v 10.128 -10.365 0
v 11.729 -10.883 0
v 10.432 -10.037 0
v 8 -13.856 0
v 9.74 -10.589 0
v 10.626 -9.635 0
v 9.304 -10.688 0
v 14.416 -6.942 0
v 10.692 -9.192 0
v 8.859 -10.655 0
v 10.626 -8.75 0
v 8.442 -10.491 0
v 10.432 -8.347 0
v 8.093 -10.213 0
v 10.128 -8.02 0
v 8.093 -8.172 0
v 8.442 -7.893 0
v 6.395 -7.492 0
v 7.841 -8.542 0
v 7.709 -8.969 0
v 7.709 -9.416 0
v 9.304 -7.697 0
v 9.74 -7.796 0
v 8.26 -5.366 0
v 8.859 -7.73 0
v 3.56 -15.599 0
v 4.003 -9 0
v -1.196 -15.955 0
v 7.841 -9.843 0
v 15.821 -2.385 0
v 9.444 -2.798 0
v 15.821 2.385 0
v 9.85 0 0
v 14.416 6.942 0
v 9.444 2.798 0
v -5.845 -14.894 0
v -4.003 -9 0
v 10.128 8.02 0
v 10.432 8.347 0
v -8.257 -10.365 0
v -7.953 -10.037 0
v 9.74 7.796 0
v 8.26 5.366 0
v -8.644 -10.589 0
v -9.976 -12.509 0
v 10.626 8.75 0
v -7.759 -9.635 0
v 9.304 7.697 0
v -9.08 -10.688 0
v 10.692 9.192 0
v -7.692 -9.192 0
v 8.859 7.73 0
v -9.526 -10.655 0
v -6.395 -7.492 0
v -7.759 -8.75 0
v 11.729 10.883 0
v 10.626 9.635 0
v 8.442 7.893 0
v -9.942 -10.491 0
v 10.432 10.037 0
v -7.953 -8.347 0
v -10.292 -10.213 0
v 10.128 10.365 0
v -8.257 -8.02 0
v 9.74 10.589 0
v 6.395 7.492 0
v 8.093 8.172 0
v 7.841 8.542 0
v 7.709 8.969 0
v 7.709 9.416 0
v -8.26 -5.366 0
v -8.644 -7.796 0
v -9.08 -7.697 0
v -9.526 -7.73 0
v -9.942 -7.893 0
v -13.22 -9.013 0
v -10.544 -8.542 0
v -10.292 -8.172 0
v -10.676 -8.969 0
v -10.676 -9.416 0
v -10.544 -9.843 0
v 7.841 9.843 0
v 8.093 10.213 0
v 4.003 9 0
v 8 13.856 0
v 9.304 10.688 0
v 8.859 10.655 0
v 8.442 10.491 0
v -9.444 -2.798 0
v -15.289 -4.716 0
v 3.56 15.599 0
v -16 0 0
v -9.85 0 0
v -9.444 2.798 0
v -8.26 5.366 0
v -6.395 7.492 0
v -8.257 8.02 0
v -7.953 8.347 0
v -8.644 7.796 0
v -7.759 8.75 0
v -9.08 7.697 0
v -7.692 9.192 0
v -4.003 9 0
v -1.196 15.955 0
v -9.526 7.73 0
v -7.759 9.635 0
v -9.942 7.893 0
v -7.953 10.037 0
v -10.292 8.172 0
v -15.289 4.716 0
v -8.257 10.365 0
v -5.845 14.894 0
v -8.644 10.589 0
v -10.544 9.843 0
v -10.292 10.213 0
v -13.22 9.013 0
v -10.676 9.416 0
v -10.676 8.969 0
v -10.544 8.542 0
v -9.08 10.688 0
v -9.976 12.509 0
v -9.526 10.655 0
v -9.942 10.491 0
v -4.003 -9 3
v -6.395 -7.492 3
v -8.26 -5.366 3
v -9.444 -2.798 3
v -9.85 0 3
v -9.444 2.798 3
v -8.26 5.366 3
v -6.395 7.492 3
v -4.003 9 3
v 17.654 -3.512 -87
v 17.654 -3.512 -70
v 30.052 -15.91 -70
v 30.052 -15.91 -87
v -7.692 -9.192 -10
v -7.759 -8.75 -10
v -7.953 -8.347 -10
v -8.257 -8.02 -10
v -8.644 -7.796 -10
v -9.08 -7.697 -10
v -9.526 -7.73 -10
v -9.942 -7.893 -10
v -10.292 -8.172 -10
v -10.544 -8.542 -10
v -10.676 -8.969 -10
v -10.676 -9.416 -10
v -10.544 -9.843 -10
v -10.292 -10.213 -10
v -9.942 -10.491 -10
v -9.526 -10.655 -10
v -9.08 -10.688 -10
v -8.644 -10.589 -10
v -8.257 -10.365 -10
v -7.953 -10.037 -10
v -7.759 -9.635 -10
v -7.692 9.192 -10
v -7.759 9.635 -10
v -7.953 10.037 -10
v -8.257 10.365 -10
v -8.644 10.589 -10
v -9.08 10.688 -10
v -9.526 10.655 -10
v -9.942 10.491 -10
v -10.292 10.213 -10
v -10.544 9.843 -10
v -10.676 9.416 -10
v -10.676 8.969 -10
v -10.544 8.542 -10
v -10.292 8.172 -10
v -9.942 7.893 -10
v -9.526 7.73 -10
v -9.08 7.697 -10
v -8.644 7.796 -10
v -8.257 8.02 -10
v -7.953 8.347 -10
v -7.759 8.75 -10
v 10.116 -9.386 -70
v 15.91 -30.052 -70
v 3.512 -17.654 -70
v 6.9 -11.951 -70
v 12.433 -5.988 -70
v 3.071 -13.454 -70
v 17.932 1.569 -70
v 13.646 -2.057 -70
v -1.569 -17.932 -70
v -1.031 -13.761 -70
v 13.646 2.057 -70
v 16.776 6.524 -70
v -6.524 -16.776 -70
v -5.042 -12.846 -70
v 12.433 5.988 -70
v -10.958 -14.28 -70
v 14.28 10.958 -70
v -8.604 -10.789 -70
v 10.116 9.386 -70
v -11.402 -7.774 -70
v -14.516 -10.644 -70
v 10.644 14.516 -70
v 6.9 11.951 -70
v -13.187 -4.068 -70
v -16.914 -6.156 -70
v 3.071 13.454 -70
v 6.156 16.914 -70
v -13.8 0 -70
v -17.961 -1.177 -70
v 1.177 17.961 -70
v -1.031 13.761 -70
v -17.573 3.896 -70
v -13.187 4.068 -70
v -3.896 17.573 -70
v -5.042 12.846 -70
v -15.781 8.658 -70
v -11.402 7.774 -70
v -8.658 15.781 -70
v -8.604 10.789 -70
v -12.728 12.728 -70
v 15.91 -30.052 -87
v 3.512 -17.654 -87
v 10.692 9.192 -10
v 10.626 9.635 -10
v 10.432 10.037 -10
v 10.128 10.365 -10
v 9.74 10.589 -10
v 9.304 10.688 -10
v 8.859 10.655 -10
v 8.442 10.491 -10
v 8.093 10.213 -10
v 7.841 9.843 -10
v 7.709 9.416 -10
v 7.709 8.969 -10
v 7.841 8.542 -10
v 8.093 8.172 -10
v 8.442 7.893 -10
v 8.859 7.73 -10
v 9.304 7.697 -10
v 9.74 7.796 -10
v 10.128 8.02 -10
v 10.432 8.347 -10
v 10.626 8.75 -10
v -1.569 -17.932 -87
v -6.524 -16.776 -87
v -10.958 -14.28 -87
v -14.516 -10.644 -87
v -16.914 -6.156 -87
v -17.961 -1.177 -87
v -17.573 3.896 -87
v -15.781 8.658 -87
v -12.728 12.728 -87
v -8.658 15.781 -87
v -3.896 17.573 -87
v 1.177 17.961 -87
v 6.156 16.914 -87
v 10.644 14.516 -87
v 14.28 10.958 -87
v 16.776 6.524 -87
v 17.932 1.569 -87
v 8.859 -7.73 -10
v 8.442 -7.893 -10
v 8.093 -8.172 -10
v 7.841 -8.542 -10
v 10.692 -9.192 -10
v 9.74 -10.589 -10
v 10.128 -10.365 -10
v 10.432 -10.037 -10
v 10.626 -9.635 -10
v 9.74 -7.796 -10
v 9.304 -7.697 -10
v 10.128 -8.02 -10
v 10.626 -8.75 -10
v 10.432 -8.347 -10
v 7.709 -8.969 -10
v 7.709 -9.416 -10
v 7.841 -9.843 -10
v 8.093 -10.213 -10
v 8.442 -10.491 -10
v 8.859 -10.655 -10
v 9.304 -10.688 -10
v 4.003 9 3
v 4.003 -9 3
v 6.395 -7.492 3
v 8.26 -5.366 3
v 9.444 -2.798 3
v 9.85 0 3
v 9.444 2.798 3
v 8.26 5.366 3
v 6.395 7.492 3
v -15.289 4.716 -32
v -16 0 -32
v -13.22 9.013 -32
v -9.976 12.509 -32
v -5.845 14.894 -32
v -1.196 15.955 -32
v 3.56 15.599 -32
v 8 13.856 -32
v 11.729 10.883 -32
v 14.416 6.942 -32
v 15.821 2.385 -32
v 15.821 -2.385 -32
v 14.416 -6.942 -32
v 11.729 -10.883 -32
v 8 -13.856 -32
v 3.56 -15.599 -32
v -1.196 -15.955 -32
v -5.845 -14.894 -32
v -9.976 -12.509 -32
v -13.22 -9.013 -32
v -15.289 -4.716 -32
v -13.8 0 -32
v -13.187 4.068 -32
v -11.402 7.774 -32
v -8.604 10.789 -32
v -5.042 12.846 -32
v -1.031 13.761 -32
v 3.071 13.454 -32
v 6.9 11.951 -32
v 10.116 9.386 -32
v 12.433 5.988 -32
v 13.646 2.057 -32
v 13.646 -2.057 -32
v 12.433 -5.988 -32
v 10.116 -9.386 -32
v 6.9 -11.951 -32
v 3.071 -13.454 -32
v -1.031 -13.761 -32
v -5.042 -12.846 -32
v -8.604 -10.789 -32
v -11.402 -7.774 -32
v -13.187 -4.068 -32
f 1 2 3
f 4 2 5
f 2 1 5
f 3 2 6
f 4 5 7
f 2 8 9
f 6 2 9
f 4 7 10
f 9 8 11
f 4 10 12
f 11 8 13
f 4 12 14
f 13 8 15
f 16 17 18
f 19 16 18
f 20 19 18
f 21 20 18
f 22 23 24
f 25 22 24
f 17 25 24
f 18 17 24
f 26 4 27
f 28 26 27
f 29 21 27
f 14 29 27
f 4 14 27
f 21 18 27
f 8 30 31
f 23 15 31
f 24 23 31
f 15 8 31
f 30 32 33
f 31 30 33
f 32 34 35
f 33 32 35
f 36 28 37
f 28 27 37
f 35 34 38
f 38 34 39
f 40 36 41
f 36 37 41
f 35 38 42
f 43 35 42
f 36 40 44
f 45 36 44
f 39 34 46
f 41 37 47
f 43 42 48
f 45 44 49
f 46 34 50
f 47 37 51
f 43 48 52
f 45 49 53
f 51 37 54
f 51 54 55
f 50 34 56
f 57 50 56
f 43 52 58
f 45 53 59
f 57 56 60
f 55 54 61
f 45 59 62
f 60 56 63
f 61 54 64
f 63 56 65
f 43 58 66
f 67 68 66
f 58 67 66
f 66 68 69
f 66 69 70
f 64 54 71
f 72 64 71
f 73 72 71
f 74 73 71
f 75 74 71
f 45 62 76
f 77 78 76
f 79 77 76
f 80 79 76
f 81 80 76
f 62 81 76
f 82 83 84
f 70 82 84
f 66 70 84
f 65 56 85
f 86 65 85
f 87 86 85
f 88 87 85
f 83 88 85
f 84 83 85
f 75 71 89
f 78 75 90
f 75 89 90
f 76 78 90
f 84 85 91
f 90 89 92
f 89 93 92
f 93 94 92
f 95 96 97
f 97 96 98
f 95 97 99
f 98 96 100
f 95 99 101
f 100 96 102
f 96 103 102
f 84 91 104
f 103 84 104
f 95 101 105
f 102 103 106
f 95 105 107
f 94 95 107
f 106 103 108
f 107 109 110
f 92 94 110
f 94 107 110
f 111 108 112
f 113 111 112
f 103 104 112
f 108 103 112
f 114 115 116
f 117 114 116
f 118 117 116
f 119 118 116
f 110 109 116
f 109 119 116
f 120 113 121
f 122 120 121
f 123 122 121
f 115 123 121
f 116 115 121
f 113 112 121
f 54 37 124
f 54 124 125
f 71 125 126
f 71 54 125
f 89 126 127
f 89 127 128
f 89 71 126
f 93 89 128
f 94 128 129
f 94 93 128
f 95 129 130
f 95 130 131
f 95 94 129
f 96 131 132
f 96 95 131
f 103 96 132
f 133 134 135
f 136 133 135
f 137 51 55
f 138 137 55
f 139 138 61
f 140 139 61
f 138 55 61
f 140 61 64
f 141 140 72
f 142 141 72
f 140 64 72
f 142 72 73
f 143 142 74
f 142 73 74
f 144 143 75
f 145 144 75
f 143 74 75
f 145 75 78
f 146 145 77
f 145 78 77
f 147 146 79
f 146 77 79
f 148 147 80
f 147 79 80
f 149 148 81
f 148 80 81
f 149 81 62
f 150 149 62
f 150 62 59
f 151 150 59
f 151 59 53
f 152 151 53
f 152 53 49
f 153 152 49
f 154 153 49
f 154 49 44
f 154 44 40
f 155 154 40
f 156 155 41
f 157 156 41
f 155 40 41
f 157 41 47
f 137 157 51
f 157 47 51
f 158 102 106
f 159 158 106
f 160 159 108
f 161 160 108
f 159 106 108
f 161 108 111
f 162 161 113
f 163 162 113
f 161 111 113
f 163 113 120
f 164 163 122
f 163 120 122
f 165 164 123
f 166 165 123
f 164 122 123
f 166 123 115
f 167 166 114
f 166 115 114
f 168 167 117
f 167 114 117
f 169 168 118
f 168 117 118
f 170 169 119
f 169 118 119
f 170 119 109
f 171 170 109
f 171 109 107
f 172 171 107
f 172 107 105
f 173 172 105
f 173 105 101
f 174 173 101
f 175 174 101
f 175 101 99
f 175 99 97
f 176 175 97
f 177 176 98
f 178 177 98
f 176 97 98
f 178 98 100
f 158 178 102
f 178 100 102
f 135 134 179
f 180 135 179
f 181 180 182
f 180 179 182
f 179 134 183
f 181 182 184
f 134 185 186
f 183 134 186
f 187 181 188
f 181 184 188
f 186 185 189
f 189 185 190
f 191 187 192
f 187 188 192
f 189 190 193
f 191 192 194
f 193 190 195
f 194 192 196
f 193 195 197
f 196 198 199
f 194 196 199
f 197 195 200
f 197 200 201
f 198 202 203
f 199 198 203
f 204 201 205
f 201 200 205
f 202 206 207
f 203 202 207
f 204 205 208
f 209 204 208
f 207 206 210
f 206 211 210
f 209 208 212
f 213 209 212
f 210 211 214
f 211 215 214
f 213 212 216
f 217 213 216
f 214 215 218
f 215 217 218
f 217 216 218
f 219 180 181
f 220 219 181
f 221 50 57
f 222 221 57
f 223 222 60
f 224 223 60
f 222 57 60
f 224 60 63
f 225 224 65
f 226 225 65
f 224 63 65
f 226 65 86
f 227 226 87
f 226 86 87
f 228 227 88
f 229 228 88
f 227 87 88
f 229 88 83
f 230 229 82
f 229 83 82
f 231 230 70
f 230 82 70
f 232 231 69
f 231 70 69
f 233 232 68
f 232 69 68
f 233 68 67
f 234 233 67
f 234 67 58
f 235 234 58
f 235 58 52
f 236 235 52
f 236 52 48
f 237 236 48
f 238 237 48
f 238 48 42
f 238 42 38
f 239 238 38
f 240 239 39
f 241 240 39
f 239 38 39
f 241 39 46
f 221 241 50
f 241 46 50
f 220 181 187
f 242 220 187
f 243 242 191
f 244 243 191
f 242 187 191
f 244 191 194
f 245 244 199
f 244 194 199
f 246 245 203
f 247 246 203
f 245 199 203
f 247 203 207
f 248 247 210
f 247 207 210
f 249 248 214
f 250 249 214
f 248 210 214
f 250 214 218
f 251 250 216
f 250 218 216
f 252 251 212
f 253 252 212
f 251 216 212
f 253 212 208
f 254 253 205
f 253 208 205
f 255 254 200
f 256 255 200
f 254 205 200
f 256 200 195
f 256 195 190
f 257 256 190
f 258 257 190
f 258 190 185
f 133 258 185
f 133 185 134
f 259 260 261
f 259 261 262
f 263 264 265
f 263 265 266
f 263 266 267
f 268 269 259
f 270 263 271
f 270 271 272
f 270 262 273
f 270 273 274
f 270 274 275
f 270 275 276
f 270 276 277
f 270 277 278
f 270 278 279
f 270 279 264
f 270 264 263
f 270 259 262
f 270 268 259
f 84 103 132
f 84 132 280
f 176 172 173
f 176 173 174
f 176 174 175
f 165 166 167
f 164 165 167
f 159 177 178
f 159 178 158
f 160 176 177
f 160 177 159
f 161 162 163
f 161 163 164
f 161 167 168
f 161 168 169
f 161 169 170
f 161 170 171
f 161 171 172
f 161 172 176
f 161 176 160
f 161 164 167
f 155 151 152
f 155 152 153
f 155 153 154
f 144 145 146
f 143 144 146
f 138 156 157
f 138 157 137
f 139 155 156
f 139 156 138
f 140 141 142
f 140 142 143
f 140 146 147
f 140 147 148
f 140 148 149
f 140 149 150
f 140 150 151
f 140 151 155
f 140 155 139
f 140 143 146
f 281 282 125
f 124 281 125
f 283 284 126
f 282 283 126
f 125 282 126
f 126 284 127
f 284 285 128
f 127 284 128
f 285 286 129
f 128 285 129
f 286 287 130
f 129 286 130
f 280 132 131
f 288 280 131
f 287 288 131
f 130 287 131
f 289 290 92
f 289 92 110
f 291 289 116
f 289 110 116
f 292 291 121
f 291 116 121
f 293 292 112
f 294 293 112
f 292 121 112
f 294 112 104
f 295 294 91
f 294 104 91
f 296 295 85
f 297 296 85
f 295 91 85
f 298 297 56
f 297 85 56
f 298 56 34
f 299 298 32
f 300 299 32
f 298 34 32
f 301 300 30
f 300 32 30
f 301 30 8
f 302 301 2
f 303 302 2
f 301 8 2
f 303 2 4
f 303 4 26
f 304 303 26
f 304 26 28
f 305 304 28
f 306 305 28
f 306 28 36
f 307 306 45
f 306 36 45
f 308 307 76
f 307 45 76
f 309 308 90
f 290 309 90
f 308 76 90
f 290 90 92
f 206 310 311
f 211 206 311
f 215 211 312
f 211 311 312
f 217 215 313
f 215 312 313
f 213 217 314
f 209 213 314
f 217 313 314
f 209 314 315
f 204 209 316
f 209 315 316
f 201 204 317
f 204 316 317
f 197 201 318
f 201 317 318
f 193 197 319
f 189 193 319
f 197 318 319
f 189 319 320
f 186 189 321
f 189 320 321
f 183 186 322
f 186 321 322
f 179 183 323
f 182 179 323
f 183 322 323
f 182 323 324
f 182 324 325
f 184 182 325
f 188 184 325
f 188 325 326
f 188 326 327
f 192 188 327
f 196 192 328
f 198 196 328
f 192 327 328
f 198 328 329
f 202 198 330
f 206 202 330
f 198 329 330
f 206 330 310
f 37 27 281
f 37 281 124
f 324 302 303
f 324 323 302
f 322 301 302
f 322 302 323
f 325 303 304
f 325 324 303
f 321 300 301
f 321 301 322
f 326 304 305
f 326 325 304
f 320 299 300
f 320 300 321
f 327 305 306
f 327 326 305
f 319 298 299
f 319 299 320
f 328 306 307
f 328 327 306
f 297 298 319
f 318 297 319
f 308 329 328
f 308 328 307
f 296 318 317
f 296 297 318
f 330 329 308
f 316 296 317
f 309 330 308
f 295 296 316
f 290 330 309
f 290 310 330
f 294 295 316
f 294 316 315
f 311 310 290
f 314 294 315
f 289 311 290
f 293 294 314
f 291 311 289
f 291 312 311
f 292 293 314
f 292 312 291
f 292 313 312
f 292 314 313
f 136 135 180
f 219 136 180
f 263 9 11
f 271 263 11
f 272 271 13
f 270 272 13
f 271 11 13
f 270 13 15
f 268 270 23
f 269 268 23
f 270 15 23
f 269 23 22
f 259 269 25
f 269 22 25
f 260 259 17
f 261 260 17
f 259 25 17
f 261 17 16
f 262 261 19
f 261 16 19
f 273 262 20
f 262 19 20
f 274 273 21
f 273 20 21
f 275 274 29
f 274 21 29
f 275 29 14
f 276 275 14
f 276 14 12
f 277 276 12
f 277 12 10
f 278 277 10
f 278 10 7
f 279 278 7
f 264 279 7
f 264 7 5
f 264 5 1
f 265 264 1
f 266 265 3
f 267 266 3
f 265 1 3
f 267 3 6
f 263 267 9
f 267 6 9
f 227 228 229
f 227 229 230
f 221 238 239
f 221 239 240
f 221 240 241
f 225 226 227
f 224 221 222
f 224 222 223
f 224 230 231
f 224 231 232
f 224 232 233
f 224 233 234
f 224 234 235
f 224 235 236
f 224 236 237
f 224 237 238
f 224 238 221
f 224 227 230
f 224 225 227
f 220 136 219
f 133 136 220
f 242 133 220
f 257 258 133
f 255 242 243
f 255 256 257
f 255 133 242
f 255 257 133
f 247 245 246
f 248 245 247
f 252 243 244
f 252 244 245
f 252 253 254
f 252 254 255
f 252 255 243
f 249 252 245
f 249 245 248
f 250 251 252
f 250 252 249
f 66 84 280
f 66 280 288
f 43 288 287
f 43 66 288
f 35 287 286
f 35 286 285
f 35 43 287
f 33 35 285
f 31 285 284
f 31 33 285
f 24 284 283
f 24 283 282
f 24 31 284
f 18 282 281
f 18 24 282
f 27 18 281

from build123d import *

# Parameters (mm, degrees)
BOSS_EXTRUDE1_DEPTH = 3
SKETCH2_R           = 16
BOSS_EXTRUDE2_DEPTH = 32
SKETCH3_R           = 13.8
BOSS_EXTRUDE3_DEPTH = 38
SKETCH4_R           = 18
SKETCH4_R_2         = 13.8
BOSS_EXTRUDE4_DEPTH = 17
SKETCH6_R           = 1.5
CUT_EXTRUDE1_DEPTH  = 10


with BuildPart() as part:
    # Sketch1 → Boss-Extrude1 (new body)
    with BuildSketch(Plane.XY):
        with BuildLine():
            Line((-4.002811512, 9), (4.002811512, 9))
            ThreePointArc((4.002811512, 9), (9.85, 0), (4.002811512, -9))
            Line((4.002811512, -9), (-4.002811512, -9))
            ThreePointArc((-4.002811512, -9), (-9.85, 0), (-4.002811512, 9))
        make_face()
    extrude(amount=BOSS_EXTRUDE1_DEPTH)

    # Sketch2 → Boss-Extrude2 (add)
    with BuildSketch(Plane(origin=(0, 0, 0), x_dir=(-1, 0, 0), z_dir=(0, 0, -1))):
        Circle(SKETCH2_R)
    extrude(amount=BOSS_EXTRUDE2_DEPTH)

    # Sketch3 → Boss-Extrude3 (add)
    with BuildSketch(Plane(origin=(0, 0, -32), x_dir=(-1, 0, 0), z_dir=(0, 0, -1))):
        Circle(SKETCH3_R)
    extrude(amount=BOSS_EXTRUDE3_DEPTH)

    # Sketch4 → Boss-Extrude4 (add)
    with BuildSketch(Plane(origin=(0, 0, -70), x_dir=(-1, 0, 0), z_dir=(0, 0, -1))):
        Circle(SKETCH4_R)
        Circle(SKETCH4_R_2, mode=Mode.SUBTRACT)
        Circle(SKETCH4_R_2)
        with BuildLine():
            Line((-17.654073056, -3.511937432), (-30.0520382, -15.909902577))
            Line((-30.0520382, -15.909902577), (-15.909902577, -30.0520382))
            Line((-15.909902577, -30.0520382), (-3.511937432, -17.654073056))
            ThreePointArc((-3.511937432, -17.654073056), (-12.727922061, -12.727922061), (-17.654073056, -3.511937432))
        make_face()
    extrude(amount=BOSS_EXTRUDE4_DEPTH)

    # Sketch6 → Cut-Extrude1 (cut)
    with BuildSketch(Plane.XY):
        with Locations((-9.192388155, 9.192388155)):
            Circle(SKETCH6_R)
        with Locations((9.192388155, 9.192388155)):
            Circle(SKETCH6_R)
        with Locations((9.192388155, -9.192388155)):
            Circle(SKETCH6_R)
        with Locations((-9.192388155, -9.192388155)):
            Circle(SKETCH6_R)
    extrude(amount=-CUT_EXTRUDE1_DEPTH, mode=Mode.SUBTRACT)


solid = part.part
